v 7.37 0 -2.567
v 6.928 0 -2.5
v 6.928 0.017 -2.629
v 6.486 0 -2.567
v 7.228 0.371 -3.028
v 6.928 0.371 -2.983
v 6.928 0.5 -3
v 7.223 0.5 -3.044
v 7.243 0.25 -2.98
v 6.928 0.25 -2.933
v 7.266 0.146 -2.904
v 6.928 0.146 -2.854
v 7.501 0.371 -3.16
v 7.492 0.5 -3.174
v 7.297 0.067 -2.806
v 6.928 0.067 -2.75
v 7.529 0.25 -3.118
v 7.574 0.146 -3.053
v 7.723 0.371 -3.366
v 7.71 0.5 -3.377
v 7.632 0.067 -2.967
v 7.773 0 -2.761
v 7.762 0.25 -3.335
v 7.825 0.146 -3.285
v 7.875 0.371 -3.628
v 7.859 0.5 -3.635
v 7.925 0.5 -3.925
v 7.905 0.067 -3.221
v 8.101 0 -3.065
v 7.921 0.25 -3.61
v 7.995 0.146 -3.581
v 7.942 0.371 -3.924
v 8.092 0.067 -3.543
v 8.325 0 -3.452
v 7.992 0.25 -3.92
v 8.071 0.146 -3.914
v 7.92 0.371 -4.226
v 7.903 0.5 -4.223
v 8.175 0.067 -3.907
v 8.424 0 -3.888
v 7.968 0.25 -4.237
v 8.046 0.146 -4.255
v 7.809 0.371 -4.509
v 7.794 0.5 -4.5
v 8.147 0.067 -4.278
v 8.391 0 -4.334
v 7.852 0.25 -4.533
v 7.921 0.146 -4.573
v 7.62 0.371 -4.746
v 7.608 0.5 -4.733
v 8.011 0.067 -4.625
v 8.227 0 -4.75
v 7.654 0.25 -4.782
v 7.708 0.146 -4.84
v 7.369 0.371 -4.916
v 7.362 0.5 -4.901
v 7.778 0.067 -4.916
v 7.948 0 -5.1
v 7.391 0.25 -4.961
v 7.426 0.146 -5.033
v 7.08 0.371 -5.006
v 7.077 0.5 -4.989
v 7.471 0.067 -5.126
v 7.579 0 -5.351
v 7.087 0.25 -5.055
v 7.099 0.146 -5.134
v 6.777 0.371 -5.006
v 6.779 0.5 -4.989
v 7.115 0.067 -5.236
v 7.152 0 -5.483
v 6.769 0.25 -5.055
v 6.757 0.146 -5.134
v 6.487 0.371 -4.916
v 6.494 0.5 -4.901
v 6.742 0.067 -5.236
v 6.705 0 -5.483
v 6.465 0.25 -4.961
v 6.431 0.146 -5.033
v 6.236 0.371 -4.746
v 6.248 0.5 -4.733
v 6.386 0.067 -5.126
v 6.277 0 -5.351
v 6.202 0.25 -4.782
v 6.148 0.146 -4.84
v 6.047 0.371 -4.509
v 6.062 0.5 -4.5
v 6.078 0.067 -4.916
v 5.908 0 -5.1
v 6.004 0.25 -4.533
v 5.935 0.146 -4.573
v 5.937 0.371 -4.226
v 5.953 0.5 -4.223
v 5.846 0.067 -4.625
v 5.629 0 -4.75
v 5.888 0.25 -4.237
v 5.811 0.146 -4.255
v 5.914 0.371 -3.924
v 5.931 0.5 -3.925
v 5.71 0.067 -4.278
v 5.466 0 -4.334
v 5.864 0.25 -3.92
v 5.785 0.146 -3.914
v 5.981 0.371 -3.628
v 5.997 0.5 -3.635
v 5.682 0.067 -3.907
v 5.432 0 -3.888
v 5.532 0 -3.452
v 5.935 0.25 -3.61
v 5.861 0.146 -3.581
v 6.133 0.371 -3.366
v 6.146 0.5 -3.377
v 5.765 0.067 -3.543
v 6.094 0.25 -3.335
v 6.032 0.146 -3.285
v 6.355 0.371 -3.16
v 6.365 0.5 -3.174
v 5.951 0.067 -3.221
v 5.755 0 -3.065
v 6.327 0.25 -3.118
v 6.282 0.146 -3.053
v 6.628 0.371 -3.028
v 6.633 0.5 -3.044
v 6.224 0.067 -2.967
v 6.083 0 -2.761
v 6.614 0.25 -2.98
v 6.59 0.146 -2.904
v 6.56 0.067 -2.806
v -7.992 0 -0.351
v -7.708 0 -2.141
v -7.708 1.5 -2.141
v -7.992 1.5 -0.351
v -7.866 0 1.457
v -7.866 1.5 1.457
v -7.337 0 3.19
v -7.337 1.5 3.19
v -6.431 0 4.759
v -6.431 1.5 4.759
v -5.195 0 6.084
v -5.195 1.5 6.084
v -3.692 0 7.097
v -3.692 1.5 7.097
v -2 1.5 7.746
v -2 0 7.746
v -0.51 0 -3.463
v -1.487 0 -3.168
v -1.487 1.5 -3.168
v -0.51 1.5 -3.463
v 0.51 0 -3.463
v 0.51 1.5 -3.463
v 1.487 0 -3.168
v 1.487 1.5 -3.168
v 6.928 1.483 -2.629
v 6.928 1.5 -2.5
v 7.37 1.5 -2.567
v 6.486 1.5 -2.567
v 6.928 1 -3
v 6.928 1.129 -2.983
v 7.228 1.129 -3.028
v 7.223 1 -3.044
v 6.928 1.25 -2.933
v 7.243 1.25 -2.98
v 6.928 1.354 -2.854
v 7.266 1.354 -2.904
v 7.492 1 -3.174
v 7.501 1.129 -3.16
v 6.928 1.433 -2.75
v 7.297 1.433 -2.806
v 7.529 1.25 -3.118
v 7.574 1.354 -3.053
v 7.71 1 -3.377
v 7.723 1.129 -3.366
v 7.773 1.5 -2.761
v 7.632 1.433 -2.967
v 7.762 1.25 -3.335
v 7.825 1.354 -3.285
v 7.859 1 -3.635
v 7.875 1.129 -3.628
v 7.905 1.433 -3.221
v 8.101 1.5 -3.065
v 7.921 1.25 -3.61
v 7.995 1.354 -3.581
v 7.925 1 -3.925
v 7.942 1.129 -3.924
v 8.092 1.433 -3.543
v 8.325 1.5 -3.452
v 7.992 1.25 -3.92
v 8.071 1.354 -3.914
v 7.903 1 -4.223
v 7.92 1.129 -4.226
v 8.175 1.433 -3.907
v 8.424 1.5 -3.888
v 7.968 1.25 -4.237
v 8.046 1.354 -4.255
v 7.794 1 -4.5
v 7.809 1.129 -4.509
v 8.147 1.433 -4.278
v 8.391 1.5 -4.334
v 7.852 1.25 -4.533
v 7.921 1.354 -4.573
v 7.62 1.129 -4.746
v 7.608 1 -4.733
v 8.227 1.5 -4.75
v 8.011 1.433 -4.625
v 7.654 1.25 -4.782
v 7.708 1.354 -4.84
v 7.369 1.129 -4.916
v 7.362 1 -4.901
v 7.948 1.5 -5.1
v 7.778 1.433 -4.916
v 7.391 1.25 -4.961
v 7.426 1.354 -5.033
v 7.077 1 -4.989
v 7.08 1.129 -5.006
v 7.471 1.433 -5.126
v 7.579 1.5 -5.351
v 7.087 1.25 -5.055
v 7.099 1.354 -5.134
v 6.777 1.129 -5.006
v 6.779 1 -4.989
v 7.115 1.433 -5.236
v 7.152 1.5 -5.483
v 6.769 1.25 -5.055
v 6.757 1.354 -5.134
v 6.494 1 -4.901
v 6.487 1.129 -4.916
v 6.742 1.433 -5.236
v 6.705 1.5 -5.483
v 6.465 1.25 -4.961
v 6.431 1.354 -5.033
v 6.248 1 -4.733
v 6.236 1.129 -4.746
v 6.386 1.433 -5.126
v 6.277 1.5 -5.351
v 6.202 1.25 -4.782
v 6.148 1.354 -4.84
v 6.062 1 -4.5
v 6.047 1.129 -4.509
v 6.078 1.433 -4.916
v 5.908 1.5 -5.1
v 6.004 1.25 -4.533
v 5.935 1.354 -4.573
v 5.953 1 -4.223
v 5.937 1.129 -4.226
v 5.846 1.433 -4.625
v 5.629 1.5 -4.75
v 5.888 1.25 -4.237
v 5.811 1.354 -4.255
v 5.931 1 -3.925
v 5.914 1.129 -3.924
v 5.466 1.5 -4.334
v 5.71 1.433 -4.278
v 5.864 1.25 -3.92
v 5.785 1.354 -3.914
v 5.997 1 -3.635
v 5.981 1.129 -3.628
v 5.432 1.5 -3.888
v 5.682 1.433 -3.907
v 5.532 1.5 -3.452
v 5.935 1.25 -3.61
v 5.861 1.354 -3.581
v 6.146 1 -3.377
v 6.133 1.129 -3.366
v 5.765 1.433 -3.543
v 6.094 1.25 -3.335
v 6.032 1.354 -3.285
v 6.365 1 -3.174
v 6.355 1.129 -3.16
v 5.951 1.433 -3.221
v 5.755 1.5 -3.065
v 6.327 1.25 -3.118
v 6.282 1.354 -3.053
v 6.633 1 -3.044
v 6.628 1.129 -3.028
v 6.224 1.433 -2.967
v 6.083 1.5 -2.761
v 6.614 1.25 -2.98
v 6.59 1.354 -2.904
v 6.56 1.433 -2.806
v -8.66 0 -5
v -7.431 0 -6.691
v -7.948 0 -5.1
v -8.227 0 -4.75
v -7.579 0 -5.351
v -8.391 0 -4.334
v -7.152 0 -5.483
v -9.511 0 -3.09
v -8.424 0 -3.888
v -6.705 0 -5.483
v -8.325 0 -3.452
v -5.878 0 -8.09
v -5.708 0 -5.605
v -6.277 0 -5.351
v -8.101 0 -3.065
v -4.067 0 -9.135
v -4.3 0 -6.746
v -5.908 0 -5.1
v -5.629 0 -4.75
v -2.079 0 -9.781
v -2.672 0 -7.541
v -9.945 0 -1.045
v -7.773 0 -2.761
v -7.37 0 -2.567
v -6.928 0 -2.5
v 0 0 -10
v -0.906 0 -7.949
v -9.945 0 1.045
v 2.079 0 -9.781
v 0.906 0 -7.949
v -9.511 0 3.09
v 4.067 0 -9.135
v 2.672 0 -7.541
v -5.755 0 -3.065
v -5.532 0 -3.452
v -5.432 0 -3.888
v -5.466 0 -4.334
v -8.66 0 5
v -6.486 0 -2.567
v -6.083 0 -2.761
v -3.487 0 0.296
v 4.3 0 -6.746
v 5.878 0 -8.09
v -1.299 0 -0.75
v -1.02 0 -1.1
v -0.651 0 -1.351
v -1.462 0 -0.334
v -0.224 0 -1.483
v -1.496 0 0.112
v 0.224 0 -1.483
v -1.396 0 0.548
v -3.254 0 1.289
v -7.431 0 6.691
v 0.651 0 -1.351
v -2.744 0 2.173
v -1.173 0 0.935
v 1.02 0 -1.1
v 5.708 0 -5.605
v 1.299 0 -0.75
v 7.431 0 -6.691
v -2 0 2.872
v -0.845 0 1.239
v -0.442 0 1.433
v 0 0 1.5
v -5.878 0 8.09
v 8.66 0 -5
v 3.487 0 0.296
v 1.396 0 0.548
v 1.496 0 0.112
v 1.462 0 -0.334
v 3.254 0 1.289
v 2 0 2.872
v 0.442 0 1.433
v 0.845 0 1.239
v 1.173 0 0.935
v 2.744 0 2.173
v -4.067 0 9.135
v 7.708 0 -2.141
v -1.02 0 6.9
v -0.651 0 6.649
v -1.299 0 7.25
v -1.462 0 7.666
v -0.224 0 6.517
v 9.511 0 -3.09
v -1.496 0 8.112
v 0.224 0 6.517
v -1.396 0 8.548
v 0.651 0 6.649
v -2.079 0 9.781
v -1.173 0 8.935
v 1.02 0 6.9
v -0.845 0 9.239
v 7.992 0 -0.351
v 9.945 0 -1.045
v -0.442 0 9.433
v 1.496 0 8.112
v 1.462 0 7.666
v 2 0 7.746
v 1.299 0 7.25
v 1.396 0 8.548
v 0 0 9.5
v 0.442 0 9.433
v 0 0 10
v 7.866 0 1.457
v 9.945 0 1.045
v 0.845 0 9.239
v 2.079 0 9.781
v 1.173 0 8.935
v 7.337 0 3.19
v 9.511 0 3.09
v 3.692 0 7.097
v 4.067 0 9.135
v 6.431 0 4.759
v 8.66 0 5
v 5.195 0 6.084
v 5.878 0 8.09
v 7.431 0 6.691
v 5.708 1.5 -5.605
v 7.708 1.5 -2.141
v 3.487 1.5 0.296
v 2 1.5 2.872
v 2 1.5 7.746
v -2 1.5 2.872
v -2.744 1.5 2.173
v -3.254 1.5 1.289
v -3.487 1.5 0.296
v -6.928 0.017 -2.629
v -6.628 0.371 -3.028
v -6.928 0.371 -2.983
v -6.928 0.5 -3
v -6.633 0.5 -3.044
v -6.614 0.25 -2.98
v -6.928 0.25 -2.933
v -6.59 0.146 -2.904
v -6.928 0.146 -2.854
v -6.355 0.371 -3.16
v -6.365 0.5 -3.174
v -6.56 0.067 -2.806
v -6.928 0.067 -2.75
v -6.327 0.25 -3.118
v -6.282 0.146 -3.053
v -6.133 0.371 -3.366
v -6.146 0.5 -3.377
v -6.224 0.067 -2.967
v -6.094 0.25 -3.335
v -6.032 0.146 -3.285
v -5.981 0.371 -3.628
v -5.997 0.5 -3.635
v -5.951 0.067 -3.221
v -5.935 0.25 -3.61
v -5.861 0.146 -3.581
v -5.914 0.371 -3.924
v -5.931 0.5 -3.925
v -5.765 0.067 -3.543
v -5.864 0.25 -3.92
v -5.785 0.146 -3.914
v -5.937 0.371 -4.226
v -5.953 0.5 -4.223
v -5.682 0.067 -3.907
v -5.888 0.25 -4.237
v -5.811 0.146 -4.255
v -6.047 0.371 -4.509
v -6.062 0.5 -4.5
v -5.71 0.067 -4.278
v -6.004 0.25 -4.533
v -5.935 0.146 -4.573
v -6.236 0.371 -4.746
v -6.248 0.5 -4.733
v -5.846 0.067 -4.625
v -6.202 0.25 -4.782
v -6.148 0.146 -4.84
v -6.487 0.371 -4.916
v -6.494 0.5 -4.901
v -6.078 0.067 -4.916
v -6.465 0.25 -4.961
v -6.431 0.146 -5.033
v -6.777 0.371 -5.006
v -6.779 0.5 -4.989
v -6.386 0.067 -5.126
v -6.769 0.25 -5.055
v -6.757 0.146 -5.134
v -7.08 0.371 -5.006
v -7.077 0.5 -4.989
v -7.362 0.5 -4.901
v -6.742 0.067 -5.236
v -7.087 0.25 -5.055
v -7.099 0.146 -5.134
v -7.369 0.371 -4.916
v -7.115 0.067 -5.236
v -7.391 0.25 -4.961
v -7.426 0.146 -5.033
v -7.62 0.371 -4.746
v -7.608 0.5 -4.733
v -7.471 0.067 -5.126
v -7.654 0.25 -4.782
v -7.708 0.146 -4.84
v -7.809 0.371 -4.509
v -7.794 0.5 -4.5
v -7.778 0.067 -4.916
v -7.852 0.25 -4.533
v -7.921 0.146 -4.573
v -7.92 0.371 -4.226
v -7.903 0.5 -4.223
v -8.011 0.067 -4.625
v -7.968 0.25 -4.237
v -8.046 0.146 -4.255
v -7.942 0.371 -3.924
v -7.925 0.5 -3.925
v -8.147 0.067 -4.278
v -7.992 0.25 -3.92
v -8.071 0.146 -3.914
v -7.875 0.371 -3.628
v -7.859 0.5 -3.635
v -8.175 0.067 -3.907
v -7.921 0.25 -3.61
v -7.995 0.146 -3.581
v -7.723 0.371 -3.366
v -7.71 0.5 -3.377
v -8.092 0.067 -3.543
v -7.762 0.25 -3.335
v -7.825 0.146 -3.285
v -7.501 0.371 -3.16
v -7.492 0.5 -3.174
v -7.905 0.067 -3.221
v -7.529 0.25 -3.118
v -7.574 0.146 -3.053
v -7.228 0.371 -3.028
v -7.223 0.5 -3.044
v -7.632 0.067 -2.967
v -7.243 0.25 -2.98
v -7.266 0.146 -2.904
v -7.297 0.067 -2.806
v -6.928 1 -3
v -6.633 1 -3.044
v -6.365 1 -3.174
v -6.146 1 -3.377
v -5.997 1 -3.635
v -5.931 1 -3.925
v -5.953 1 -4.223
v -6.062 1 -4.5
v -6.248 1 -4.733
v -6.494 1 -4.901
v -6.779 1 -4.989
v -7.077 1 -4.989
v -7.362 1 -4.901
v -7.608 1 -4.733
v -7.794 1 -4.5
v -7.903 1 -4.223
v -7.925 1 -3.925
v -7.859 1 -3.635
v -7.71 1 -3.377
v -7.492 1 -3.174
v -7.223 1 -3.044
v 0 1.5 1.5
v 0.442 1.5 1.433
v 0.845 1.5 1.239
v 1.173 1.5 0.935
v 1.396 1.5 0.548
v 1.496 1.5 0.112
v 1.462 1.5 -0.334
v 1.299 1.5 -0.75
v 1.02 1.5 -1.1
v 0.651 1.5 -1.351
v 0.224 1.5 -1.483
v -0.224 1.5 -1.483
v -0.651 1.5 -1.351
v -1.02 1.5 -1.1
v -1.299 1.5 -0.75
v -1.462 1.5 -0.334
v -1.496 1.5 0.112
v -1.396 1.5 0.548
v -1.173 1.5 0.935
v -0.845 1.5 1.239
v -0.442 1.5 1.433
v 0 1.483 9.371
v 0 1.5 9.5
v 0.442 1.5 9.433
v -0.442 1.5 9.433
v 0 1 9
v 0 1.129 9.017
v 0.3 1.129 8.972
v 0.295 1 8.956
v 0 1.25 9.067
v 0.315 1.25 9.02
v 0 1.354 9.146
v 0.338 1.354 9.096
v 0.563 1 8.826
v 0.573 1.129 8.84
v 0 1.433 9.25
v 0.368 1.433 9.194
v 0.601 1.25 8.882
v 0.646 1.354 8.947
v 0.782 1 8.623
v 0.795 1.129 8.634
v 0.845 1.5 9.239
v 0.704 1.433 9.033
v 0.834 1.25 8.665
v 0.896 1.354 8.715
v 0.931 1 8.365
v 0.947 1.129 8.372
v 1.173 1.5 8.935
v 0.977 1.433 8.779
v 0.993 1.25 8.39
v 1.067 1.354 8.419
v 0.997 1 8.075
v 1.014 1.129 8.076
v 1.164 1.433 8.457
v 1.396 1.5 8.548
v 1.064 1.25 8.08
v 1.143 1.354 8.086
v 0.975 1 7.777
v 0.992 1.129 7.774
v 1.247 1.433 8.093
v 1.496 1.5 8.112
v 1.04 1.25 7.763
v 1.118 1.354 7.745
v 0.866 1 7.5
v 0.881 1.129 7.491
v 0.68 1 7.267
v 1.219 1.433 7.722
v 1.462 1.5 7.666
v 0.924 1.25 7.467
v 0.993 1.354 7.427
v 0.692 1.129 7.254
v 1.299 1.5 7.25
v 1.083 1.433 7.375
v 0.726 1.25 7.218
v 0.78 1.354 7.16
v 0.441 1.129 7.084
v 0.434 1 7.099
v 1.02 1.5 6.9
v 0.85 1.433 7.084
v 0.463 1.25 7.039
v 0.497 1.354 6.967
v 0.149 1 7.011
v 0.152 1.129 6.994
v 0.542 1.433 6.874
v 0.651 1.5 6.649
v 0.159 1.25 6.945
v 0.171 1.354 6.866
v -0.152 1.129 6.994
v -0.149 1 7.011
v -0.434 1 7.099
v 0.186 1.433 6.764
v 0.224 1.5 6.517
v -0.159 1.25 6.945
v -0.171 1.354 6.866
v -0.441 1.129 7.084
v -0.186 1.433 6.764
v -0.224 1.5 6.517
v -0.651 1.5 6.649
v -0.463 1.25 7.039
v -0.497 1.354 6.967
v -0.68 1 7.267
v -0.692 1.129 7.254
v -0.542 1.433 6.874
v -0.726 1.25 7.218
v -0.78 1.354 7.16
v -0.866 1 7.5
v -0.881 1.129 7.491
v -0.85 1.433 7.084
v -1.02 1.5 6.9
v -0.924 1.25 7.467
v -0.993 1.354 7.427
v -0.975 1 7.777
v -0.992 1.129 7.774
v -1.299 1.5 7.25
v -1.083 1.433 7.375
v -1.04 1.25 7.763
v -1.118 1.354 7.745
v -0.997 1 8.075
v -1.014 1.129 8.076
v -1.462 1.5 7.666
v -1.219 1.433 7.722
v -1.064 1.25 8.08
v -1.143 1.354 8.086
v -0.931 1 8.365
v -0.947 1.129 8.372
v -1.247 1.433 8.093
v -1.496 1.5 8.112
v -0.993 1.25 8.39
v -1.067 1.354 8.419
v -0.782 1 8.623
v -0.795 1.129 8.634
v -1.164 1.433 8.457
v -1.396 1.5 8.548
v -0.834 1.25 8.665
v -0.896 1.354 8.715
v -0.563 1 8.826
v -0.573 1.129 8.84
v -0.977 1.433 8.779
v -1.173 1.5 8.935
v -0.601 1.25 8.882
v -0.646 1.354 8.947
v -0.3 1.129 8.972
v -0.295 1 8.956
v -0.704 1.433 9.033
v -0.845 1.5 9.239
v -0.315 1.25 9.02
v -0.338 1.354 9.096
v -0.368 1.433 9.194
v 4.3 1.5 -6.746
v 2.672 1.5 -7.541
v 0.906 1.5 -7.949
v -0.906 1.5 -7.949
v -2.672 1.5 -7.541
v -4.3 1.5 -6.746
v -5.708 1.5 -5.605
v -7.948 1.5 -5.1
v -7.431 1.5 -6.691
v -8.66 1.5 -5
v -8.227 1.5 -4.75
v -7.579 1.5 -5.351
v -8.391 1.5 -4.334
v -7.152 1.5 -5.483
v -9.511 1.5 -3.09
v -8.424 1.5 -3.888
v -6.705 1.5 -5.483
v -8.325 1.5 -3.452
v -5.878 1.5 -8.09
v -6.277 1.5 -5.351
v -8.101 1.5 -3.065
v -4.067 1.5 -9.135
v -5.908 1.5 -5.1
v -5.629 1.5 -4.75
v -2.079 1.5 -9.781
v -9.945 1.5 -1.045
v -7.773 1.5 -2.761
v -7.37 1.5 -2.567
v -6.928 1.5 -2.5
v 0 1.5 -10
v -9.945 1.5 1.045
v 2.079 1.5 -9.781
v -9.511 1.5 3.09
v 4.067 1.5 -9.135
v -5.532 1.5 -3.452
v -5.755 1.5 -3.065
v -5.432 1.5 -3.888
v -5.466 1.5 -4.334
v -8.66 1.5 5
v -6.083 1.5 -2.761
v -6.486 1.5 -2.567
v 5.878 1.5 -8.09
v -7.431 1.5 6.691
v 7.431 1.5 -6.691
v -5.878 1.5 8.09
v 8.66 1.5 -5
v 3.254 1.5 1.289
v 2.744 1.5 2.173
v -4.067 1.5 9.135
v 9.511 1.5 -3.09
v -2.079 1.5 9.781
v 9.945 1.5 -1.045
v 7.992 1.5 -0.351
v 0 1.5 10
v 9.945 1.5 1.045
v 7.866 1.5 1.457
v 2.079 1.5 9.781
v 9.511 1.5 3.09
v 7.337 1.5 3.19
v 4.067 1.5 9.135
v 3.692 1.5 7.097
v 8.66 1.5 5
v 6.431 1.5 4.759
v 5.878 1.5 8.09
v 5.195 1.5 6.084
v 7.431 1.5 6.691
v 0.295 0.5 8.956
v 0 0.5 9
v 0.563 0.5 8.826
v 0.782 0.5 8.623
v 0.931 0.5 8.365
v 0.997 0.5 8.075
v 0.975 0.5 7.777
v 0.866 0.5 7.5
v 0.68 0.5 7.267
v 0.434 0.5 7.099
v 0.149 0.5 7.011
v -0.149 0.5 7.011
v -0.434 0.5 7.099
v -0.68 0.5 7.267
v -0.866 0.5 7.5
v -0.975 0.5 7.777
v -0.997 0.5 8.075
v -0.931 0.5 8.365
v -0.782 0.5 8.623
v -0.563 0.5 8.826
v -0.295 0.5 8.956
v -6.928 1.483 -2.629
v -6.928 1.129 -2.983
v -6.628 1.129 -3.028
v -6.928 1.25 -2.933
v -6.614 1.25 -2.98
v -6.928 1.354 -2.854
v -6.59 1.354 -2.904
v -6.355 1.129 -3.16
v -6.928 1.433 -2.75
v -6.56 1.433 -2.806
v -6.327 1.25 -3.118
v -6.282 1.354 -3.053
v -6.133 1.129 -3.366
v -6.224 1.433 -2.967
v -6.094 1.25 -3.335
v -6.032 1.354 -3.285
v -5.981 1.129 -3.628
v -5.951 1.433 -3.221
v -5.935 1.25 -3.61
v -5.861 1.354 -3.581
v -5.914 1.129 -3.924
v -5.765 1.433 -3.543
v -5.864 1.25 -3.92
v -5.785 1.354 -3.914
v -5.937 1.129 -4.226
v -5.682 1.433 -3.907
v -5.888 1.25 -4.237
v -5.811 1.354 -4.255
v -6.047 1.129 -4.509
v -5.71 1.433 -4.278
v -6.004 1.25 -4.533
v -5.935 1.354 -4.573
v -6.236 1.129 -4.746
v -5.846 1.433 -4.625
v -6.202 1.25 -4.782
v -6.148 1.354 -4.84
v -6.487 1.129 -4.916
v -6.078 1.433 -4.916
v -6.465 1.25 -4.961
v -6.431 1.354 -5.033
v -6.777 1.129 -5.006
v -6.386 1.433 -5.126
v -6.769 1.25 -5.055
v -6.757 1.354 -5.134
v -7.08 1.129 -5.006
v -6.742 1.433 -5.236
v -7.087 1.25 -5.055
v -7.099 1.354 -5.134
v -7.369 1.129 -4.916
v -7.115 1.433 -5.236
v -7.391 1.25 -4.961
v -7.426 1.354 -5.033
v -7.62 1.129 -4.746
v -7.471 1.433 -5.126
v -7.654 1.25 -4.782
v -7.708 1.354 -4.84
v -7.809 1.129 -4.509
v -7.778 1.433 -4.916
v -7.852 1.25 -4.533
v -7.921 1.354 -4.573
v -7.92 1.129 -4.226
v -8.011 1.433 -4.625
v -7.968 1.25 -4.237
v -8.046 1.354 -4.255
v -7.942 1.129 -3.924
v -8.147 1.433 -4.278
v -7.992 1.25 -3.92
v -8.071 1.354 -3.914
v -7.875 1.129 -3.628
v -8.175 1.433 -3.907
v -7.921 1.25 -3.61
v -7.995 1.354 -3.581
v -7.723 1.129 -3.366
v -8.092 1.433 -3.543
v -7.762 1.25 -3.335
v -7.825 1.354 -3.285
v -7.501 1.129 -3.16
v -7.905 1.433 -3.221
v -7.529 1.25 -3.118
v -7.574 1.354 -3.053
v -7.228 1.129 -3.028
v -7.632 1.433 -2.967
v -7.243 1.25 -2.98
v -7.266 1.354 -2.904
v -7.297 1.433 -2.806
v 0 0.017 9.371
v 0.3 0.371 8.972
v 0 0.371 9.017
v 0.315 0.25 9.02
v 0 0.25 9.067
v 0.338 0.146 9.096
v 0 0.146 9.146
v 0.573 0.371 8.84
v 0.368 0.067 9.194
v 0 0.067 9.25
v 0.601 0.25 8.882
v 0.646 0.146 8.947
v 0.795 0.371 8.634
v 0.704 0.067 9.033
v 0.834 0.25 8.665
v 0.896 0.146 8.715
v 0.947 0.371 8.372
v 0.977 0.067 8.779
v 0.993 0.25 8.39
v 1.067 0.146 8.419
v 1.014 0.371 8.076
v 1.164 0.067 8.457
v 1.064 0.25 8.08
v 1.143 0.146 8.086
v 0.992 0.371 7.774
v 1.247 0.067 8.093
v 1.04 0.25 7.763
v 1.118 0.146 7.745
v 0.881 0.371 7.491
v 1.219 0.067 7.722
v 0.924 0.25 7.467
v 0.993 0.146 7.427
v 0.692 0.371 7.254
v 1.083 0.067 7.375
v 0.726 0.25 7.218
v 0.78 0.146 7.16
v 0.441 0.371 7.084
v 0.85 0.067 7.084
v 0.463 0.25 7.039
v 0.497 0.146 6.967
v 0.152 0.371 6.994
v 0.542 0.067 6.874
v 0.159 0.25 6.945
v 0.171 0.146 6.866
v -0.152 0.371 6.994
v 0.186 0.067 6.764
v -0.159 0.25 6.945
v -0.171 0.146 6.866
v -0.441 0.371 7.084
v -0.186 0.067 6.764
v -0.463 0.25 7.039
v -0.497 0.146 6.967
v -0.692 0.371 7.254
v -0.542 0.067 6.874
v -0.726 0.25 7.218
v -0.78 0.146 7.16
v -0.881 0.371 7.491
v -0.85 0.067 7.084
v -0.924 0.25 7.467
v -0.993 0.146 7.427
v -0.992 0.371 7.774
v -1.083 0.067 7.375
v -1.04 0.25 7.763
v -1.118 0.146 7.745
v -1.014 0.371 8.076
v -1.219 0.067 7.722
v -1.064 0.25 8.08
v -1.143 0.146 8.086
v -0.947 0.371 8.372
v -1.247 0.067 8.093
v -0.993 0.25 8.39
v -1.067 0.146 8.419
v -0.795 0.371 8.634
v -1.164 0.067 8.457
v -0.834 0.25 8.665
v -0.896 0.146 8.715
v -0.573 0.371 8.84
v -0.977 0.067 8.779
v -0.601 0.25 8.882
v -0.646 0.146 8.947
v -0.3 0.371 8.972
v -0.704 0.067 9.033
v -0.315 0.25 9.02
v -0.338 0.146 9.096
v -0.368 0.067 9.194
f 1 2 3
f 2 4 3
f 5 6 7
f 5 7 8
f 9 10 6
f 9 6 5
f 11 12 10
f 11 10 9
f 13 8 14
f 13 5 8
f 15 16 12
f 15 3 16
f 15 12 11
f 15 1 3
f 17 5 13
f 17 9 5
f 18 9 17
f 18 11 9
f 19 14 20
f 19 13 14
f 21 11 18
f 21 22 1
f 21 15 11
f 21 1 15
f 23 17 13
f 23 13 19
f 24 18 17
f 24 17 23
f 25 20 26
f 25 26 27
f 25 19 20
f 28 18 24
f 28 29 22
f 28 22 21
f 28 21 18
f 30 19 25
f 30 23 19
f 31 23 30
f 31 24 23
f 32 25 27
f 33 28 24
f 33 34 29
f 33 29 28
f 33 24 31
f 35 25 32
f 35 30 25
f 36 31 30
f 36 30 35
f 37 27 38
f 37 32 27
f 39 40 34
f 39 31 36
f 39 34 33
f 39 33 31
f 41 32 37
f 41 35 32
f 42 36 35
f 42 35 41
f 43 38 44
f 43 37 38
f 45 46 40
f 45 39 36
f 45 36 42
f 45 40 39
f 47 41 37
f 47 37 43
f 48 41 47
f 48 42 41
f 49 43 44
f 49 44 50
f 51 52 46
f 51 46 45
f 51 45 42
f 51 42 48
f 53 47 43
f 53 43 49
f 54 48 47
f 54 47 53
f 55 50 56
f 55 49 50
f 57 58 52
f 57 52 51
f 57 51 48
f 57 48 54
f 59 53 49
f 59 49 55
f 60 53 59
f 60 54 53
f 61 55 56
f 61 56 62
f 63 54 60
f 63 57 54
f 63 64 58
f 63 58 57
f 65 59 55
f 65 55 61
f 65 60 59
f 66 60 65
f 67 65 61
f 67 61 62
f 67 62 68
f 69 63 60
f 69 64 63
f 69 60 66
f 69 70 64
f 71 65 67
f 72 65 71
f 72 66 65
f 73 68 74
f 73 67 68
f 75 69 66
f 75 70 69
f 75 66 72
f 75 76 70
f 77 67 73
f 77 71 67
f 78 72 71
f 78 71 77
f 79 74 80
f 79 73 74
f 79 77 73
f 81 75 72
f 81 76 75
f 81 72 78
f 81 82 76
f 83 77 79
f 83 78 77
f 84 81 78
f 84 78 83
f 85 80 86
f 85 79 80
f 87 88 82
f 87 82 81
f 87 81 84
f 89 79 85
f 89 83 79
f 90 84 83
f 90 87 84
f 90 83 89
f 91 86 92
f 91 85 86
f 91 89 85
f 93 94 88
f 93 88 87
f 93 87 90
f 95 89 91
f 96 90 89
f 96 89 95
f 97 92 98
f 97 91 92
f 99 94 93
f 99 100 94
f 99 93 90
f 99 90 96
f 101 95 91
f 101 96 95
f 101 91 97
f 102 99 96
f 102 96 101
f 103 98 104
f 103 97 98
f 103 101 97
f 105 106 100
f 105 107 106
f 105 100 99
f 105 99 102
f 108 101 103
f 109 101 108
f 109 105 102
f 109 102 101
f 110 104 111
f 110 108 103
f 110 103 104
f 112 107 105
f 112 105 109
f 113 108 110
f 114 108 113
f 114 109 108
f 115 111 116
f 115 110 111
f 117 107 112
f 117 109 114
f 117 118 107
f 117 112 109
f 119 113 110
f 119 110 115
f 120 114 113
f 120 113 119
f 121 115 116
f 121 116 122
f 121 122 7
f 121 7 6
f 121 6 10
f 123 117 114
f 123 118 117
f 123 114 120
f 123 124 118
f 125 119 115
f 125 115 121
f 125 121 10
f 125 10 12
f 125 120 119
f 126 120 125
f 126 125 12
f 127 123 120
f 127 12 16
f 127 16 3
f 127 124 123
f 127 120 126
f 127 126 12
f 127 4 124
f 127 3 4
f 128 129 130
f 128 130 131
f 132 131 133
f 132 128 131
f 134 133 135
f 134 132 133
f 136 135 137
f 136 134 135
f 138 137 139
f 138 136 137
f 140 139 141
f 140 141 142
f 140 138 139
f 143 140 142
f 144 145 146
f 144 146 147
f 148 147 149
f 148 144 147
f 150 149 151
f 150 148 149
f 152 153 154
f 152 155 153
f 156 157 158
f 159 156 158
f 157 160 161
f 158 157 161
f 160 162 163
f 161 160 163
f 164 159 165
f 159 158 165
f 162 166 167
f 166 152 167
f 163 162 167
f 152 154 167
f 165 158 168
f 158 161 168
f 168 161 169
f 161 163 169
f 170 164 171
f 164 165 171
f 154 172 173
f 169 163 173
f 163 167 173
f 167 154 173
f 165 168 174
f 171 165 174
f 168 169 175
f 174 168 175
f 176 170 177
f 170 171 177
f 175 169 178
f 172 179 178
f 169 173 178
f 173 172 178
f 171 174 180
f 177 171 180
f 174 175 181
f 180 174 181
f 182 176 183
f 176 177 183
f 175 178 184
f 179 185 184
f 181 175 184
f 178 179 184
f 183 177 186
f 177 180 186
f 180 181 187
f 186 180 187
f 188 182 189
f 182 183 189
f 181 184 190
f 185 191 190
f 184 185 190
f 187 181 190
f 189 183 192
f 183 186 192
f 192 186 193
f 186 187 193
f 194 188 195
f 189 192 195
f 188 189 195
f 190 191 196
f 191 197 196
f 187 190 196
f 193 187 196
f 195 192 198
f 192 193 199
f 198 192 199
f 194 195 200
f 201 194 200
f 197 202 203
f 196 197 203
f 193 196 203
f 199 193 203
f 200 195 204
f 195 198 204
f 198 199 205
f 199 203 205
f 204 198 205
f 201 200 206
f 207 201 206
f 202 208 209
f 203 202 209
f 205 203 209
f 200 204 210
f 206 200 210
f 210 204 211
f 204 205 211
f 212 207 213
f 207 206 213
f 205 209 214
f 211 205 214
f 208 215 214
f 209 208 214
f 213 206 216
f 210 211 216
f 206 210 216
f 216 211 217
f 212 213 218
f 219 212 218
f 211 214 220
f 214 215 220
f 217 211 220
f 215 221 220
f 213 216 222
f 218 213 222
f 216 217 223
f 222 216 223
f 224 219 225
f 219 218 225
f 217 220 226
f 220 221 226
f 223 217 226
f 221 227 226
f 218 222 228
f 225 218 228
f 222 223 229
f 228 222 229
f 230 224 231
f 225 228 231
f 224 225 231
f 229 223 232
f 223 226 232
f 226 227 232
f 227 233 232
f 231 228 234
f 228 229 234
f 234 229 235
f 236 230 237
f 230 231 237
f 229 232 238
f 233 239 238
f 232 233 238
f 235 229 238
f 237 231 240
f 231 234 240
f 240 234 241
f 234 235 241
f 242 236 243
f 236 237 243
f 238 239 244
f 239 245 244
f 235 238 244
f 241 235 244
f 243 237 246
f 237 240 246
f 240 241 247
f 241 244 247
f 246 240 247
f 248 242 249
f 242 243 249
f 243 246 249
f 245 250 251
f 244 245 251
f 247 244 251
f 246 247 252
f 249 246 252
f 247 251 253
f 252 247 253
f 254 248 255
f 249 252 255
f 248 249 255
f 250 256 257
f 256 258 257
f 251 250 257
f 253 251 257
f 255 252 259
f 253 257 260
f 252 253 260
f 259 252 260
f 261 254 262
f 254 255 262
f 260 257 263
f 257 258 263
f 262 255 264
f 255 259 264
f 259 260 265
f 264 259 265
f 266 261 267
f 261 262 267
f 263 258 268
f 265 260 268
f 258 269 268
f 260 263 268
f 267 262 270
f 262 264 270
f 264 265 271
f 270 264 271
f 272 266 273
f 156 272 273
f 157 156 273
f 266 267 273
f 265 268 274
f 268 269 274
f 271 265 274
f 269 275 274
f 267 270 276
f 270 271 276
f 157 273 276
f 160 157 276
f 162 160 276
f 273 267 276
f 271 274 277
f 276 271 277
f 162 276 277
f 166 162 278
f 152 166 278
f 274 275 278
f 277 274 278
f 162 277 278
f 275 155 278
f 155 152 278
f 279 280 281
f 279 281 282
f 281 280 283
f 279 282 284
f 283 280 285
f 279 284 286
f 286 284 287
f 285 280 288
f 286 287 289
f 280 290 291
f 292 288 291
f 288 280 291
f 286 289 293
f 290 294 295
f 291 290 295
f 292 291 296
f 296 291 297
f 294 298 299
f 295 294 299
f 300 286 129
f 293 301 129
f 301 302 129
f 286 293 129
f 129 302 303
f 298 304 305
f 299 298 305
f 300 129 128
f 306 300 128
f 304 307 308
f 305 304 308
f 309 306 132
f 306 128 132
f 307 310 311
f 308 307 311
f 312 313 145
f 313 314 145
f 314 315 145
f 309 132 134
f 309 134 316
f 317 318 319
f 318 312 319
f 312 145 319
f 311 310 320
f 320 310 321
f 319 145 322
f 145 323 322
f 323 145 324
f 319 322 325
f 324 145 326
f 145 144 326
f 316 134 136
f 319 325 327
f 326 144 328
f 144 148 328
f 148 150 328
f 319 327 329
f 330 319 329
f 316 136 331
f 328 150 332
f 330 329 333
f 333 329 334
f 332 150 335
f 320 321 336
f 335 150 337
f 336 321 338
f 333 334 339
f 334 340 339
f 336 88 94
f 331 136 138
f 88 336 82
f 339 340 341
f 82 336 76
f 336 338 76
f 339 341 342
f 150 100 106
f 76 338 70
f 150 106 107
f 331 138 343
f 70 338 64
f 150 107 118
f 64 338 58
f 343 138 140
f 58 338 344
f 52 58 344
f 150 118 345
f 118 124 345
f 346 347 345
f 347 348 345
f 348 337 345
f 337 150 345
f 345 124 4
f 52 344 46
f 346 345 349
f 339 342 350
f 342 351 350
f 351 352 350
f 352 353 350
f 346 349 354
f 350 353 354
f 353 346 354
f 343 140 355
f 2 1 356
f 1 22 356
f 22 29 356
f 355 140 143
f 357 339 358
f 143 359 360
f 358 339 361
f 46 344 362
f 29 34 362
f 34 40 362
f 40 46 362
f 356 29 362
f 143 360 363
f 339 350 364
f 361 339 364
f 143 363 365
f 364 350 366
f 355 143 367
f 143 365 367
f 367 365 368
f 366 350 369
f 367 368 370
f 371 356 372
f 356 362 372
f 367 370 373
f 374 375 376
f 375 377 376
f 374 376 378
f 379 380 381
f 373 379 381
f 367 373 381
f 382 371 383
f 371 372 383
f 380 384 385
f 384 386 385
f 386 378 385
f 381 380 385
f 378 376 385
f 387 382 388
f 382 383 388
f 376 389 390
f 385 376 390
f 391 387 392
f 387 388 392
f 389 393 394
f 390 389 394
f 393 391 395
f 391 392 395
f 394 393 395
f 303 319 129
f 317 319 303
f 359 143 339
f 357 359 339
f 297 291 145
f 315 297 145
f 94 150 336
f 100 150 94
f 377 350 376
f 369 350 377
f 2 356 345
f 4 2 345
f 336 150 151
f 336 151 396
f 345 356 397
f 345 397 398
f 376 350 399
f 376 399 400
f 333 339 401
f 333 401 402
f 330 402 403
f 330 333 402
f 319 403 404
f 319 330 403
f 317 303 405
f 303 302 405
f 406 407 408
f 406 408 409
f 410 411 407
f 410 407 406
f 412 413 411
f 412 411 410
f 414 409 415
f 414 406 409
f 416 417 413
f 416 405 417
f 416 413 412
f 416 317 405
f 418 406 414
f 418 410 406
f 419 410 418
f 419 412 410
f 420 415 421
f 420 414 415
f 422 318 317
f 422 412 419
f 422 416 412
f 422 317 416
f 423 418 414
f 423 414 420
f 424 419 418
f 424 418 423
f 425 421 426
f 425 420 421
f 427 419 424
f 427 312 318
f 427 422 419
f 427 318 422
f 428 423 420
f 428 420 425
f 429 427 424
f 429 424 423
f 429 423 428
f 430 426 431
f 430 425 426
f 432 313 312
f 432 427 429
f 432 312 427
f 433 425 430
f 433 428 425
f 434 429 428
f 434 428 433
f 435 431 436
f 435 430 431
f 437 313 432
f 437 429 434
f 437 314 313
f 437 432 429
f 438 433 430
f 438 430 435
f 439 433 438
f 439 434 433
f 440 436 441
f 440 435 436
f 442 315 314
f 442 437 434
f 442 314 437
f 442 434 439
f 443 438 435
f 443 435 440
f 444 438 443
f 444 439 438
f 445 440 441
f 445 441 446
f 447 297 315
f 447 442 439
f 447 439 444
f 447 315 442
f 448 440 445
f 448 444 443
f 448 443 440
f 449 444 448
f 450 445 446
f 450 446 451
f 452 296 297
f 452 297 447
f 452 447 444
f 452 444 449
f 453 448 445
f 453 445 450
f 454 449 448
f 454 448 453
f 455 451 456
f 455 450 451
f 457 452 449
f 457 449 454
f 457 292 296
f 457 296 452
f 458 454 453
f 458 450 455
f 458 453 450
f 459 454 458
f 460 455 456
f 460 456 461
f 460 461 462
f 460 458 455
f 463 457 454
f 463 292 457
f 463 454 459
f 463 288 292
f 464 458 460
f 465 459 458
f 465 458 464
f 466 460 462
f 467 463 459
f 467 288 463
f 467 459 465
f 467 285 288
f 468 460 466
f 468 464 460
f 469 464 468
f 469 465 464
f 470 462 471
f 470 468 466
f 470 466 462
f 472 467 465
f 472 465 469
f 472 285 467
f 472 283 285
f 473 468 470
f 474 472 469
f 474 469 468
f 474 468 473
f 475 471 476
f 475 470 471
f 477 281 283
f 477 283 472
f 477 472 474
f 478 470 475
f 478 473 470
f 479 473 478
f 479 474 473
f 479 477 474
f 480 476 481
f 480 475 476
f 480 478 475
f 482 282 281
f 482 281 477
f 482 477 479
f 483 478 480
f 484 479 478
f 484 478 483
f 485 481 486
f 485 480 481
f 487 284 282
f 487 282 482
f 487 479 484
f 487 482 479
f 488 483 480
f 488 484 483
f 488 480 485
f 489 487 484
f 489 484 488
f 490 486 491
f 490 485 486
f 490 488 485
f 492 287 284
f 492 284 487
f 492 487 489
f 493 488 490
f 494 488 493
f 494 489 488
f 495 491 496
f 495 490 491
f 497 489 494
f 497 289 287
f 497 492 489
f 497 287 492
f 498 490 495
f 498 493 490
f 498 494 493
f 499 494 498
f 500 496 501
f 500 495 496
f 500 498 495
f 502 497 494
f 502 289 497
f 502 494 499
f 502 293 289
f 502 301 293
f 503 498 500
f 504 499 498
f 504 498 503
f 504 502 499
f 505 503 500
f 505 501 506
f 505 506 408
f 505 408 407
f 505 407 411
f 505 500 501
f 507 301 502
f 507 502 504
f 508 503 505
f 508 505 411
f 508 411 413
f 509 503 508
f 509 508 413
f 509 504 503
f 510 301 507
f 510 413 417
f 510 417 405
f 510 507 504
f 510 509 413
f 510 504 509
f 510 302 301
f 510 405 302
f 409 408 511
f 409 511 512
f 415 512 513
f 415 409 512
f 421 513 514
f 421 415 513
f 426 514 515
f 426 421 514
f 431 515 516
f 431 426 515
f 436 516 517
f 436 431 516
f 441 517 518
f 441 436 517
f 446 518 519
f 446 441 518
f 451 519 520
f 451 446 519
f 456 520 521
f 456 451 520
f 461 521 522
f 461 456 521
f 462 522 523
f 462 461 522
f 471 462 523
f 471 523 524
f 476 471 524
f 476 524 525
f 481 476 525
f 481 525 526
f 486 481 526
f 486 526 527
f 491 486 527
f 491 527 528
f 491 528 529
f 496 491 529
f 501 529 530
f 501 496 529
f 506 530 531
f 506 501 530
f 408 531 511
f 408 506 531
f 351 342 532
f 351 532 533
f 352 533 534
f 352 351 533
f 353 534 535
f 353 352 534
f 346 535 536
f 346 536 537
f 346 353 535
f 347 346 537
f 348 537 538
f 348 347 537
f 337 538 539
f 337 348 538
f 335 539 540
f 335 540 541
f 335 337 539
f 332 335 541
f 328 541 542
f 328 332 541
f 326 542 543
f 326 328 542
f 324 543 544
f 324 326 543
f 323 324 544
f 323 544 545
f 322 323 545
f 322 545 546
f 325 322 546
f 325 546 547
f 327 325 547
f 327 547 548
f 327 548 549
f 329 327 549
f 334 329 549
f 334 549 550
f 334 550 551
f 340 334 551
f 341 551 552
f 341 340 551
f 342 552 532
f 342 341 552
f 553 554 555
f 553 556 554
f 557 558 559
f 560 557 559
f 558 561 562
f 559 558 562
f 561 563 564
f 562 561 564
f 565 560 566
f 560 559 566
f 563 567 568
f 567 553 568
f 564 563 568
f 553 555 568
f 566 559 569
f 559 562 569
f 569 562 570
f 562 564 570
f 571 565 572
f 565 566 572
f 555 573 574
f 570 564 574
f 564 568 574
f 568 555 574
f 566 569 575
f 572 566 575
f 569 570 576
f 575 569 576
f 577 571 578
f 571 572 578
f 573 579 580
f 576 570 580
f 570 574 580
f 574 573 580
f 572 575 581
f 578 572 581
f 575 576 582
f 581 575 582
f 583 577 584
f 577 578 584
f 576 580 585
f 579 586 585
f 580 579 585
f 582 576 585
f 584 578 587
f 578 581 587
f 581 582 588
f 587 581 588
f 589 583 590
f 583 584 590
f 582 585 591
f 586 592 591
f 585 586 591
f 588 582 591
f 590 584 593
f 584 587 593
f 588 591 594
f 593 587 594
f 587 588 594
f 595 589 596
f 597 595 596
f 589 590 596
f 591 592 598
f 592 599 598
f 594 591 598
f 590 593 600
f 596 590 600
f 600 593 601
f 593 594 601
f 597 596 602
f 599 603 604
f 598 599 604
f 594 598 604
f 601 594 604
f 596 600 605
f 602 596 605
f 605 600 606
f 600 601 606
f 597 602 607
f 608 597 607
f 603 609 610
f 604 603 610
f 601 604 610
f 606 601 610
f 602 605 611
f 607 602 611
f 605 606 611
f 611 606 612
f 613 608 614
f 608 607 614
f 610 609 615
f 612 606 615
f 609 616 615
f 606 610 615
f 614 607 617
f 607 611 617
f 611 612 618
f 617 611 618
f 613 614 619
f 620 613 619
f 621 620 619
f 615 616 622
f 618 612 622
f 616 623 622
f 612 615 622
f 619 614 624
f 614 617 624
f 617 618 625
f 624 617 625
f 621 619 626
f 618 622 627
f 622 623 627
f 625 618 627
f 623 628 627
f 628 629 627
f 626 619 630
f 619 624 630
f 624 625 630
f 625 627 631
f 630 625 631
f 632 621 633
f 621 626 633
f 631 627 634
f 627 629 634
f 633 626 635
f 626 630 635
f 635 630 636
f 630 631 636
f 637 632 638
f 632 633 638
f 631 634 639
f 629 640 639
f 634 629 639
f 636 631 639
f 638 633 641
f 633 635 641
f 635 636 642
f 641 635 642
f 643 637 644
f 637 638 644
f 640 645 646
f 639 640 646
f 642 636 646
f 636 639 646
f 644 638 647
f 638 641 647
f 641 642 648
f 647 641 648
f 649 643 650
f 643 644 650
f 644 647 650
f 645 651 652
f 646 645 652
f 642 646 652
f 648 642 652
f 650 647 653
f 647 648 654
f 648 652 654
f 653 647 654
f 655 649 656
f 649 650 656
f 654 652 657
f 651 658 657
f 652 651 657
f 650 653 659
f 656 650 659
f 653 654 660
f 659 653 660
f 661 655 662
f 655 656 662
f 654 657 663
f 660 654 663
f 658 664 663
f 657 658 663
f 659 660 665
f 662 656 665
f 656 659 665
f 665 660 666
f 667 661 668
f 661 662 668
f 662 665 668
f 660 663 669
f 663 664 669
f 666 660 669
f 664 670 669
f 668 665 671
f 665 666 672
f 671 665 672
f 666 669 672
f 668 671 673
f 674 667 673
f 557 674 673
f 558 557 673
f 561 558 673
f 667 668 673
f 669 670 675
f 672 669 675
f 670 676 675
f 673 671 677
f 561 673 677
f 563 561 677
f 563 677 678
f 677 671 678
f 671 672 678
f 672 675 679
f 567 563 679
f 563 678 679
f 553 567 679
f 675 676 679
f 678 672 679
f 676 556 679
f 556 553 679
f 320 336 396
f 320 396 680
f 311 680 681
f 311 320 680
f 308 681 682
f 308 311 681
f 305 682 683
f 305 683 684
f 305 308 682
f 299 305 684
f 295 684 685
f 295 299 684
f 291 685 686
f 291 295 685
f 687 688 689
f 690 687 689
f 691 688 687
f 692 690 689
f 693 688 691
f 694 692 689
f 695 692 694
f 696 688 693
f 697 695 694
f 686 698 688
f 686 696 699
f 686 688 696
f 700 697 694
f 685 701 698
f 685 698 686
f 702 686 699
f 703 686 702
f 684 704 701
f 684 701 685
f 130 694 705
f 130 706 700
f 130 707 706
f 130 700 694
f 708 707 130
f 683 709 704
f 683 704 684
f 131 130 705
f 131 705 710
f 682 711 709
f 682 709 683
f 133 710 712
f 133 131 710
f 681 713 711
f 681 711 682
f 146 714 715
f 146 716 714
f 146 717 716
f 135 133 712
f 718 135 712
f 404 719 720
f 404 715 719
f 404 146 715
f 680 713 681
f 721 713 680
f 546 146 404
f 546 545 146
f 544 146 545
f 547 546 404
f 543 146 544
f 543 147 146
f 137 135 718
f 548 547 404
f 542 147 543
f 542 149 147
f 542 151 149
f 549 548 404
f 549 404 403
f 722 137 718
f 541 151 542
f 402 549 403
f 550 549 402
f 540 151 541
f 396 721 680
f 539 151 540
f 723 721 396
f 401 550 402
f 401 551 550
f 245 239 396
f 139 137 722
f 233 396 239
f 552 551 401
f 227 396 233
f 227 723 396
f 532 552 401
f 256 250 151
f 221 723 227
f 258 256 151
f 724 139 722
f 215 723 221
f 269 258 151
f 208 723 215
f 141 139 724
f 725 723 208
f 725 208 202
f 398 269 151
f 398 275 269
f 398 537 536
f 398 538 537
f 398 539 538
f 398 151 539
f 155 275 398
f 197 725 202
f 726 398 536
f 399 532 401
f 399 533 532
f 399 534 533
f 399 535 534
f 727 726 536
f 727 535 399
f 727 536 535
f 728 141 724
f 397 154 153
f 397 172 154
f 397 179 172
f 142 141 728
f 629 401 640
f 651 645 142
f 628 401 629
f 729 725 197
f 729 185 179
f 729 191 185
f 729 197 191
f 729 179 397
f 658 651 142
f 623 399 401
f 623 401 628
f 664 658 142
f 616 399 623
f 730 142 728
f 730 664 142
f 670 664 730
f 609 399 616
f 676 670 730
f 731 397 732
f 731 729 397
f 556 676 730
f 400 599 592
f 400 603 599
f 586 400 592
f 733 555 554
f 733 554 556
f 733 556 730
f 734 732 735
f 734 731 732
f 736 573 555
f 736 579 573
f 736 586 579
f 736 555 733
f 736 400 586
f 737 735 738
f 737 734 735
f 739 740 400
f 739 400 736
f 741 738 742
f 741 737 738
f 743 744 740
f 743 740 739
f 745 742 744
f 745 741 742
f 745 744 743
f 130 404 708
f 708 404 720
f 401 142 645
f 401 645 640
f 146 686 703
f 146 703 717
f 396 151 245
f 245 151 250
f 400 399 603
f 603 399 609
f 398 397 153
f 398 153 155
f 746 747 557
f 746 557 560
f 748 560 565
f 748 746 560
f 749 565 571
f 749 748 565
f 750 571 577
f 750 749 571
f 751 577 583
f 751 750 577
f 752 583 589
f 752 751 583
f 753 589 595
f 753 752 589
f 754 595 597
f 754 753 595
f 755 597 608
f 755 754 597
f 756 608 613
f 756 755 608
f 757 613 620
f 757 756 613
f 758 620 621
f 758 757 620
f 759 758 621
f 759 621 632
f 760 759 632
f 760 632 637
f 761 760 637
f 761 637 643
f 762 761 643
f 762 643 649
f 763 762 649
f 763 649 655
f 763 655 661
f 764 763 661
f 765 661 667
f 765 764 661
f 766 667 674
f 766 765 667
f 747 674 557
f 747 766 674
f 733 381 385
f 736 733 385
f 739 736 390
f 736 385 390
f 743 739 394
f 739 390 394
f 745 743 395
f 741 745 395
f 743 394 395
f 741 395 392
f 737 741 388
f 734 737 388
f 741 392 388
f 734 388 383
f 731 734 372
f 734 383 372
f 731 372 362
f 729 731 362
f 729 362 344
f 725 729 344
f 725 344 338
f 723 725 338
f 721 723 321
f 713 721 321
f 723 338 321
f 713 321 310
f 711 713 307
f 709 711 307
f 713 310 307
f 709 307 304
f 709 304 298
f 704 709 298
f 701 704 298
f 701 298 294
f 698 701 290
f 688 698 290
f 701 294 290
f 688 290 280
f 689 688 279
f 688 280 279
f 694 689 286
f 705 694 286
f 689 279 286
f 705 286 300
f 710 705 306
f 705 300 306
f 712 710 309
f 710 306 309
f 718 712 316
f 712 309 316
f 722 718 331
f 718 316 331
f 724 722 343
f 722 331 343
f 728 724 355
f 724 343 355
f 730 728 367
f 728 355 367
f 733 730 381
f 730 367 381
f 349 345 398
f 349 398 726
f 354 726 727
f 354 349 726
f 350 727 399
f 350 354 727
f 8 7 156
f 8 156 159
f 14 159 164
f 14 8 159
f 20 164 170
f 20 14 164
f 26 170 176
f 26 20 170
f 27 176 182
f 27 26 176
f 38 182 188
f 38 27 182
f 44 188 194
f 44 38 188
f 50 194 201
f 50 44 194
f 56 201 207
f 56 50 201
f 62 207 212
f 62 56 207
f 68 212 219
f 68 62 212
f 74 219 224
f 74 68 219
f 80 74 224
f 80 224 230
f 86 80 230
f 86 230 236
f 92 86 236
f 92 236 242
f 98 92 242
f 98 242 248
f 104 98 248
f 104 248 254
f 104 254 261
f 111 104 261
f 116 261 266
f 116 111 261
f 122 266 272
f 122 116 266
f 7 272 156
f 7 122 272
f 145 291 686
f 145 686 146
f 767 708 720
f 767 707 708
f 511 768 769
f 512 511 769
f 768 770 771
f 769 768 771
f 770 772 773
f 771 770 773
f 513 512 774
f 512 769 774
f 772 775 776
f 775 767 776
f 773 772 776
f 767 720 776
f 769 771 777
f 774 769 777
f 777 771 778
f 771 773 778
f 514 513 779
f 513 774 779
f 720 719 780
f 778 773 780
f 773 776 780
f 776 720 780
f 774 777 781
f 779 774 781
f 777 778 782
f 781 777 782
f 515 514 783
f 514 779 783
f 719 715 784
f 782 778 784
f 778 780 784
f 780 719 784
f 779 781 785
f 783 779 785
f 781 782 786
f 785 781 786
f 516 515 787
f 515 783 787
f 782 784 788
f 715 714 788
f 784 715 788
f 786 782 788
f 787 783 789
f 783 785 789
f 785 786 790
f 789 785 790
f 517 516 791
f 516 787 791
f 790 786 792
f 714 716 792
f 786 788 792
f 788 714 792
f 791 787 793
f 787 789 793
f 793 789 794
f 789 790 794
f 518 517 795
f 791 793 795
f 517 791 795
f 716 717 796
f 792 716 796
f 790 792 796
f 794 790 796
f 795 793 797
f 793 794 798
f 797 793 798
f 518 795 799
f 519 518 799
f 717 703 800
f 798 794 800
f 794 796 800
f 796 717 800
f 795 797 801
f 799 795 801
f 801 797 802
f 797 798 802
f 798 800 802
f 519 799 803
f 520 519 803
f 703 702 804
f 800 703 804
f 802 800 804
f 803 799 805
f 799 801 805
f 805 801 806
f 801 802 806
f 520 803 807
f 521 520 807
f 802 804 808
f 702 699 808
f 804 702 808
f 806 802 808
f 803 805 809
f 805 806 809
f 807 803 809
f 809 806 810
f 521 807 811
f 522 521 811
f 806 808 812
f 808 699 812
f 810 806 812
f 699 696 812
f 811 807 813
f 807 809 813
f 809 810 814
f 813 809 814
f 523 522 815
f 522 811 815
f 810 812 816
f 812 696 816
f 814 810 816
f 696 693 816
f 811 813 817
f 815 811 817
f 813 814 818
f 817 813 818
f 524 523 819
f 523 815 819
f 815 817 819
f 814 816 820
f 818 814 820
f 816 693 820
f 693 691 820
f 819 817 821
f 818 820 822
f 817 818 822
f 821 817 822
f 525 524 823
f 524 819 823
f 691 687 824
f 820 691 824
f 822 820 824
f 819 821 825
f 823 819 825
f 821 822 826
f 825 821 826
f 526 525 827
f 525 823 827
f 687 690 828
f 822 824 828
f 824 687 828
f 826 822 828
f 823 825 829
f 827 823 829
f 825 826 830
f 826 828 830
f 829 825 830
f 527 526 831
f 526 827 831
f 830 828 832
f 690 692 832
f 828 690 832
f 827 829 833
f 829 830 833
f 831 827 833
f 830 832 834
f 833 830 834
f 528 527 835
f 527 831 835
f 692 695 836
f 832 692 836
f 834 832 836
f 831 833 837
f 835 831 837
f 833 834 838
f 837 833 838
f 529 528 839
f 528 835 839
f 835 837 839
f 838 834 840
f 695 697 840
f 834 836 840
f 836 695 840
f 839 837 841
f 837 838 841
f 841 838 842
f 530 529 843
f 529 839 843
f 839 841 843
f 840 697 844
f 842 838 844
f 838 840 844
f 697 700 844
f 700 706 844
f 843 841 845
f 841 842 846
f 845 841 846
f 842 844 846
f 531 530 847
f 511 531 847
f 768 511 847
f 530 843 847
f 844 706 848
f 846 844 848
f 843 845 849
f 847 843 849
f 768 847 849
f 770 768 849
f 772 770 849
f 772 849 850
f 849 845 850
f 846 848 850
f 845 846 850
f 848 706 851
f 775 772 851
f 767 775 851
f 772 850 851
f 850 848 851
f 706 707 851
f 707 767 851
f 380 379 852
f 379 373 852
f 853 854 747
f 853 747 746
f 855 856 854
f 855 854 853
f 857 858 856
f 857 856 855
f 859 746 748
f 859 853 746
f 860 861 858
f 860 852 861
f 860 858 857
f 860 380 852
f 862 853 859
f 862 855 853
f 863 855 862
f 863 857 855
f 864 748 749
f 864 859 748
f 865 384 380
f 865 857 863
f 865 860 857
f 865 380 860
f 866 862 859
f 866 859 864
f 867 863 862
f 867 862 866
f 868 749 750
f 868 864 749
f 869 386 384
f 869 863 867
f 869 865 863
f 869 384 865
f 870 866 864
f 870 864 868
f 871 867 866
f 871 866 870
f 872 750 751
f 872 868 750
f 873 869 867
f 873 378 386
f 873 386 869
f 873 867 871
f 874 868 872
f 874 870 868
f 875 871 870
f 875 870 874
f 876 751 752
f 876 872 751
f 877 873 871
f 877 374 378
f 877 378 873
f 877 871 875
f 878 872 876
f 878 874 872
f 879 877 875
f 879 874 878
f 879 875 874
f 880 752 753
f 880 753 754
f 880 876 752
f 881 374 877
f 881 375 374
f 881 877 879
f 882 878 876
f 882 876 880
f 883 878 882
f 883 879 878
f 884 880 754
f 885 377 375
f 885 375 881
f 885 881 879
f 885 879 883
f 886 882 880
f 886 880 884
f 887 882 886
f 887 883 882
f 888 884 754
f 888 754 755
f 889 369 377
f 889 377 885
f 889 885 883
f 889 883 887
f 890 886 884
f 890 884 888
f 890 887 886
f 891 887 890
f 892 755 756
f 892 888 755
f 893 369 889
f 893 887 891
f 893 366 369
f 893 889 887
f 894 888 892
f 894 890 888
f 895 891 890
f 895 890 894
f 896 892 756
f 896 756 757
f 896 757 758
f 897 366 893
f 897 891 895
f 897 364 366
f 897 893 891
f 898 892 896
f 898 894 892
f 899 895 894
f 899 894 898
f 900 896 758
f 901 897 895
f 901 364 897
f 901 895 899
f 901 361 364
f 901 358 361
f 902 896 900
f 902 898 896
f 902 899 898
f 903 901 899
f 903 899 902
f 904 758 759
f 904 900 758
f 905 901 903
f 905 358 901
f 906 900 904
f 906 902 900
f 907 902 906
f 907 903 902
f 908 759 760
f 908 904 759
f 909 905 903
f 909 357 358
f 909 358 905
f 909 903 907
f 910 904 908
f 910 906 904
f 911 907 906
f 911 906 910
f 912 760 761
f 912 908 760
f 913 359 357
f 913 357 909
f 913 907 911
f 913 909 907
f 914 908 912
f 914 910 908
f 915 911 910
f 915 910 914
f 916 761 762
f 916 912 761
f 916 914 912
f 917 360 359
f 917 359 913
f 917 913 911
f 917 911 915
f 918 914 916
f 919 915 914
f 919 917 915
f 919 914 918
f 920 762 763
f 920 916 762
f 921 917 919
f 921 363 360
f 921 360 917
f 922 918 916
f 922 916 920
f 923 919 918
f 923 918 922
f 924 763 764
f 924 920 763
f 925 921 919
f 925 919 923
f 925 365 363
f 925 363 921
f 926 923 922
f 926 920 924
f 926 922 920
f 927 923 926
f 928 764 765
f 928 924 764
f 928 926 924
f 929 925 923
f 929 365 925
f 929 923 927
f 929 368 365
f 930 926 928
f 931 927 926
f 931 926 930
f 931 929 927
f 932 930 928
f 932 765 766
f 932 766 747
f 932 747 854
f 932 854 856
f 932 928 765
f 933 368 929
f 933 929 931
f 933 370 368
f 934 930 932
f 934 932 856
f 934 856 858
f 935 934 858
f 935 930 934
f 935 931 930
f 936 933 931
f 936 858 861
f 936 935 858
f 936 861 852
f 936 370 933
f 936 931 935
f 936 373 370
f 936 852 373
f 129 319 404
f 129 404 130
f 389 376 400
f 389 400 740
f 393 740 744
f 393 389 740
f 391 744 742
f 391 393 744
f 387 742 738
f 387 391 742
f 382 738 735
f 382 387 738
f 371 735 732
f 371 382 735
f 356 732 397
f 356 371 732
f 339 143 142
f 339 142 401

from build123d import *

# Parameters (mm, degrees)
SKETCH1_R           = 10
SKETCH1_R_2         = 1.5
SKETCH1_R_3         = 1
BOSS_EXTRUDE1_DEPTH = 1.5
FILLET1_R           = 0.5


with BuildPart() as part:
    # Sketch1 → Boss-Extrude1 (new body)
    with BuildSketch(Plane(origin=(0, 0, 0), x_dir=(1, 0, 0), z_dir=(0, 1, 0))):
        with Locations(Location((0, 0, 0), (0, 0, 270))):
            Circle(SKETCH1_R)
        with Locations(Location((0, 0, 0), (0, 0, 270))):
            Circle(SKETCH1_R_2, mode=Mode.SUBTRACT)
        with Locations(Location((-6.92820323, 4, 0), (0, 0, 270))):
            Circle(SKETCH1_R_3, mode=Mode.SUBTRACT)
        with Locations(Location((6.92820323, 4, 0), (0, 0, 270))):
            Circle(SKETCH1_R_3, mode=Mode.SUBTRACT)
        with Locations(Location((0, -8, 0), (0, 0, 270))):
            Circle(SKETCH1_R_3, mode=Mode.SUBTRACT)
        with BuildLine():
            Line((-5.708203932, 5.605034154), (-1.487468593, 3.168191469))
            ThreePointArc((-1.487468593, 3.168191469), (0, 3.5), (1.487468593, 3.168191469))
            Line((1.487468593, 3.168191469), (5.708203932, 5.605034154))
            ThreePointArc((5.708203932, 5.605034154), (0, 8), (-5.708203932, 5.605034154))
        make_face(mode=Mode.SUBTRACT)
        with BuildLine():
            Line((2, -2.872281323), (2, -7.745966692))
            ThreePointArc((2, -7.745966692), (6.92820323, -4), (7.708203932, 2.140932539))
            Line((7.708203932, 2.140932539), (3.487468593, -0.295910146))
            ThreePointArc((3.487468593, -0.295910146), (3.031088913, -1.75), (2, -2.872281323))
        make_face(mode=Mode.SUBTRACT)
        with BuildLine():
            Line((-3.487468593, -0.295910146), (-7.708203932, 2.140932539))
            ThreePointArc((-7.708203932, 2.140932539), (-6.92820323, -4), (-2, -7.745966692))
            Line((-2, -7.745966692), (-2, -2.872281323))
            ThreePointArc((-2, -2.872281323), (-3.031088913, -1.75), (-3.487468593, -0.295910146))
        make_face(mode=Mode.SUBTRACT)
    extrude(amount=BOSS_EXTRUDE1_DEPTH)

    # Fillet1
    fillet1_edges = [part.edges().sort_by_distance(p)[0] for p in [
        (6.92820323, 0, -5),
        (6.92820323, 1.5, -5),
        (0, 0, 7),
        (0, 1.5, 7),
        (-6.92820323, 0, -5),
        (-6.92820323, 1.5, -5),
    ]]
    fillet(fillet1_edges, radius=FILLET1_R)


solid = part.part
